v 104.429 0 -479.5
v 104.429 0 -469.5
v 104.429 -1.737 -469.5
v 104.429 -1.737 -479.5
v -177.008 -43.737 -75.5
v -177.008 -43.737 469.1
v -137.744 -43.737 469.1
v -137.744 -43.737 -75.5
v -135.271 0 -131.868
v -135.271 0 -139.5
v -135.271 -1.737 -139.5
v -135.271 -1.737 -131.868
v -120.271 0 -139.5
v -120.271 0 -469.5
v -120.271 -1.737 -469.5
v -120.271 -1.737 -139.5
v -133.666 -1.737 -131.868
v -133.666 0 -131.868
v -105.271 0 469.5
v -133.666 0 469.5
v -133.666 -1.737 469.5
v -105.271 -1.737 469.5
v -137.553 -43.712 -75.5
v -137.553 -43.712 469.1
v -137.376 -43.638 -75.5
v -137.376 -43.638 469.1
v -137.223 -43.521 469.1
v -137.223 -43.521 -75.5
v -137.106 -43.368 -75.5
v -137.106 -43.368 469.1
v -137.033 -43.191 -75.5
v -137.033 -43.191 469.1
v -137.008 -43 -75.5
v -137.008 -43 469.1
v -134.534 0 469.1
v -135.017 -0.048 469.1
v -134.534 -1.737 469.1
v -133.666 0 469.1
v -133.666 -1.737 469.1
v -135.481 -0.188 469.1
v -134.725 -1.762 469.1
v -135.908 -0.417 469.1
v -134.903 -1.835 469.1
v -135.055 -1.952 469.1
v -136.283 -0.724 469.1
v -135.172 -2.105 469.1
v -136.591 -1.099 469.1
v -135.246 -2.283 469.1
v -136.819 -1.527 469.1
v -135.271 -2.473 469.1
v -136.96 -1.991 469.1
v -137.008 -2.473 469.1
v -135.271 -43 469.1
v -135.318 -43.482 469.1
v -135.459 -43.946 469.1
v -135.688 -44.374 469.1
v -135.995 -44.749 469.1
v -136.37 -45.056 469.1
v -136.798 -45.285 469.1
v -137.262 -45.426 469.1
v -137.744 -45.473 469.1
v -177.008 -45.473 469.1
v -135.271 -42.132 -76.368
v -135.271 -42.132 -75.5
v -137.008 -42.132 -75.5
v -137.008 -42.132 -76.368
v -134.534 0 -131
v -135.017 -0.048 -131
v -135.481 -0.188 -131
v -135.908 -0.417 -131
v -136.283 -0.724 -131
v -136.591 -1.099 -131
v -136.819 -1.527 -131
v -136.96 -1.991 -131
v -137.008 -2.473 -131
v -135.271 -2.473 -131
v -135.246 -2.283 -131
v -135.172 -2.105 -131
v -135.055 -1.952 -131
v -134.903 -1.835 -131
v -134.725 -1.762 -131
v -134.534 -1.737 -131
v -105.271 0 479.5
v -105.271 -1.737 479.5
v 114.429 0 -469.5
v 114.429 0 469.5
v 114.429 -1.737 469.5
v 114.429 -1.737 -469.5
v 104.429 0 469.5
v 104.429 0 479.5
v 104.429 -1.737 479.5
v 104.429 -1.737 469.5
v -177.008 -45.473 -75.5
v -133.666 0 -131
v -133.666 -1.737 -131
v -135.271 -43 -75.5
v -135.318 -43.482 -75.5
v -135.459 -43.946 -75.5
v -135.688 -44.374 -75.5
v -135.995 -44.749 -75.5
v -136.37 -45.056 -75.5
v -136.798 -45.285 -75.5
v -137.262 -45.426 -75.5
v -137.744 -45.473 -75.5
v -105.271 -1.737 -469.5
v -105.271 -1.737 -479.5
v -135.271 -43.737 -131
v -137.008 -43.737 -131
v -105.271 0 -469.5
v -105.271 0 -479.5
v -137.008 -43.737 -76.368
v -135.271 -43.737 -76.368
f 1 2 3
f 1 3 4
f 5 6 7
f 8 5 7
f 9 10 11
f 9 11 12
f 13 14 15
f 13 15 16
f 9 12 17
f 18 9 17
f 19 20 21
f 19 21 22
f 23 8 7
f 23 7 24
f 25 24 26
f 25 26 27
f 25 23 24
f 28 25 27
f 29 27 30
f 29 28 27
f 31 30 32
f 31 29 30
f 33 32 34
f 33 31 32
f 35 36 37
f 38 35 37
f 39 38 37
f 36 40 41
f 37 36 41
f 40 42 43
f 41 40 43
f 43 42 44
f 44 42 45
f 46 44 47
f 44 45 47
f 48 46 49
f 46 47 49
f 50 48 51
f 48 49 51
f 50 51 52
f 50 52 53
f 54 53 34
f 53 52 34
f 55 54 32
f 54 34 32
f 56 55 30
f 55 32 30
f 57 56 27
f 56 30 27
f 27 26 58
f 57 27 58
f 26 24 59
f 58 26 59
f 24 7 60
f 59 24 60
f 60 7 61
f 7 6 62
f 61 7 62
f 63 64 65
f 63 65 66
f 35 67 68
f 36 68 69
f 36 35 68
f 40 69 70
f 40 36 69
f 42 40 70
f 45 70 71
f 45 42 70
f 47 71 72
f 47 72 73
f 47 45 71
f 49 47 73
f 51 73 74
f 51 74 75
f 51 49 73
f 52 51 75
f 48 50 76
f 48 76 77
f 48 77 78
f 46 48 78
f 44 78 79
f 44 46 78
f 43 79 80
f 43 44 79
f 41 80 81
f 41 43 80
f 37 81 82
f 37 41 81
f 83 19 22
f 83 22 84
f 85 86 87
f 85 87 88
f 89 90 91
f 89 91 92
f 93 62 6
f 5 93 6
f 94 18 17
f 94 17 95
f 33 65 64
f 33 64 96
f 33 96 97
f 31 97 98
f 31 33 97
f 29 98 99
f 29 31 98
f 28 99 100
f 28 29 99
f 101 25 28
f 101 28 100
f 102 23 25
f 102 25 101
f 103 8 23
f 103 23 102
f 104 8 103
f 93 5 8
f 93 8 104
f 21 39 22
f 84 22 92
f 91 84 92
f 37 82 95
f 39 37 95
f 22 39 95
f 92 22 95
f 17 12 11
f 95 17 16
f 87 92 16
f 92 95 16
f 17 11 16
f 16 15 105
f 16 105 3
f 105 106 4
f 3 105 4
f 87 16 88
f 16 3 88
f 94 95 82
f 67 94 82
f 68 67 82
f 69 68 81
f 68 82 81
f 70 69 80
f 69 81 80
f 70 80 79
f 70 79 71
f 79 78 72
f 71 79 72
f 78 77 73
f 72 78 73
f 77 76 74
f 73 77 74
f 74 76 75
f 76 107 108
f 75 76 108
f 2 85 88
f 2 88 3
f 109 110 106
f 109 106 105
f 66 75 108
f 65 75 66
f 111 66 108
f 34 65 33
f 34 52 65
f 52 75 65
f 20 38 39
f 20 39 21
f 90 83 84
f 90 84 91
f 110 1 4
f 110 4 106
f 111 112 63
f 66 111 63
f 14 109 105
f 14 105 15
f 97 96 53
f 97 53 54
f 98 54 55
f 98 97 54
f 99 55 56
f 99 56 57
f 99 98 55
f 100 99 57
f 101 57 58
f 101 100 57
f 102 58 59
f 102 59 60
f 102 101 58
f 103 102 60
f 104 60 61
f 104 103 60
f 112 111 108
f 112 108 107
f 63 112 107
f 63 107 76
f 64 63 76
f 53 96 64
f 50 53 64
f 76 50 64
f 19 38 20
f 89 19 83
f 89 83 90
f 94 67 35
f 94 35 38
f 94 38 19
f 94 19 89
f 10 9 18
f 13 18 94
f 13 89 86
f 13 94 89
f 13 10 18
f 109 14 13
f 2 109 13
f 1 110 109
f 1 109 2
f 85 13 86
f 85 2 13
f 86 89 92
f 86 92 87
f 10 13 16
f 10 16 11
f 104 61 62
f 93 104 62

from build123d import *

# Parameters (mm, degrees)
BASE_FLANGE1_DEPTH            = 1.7366
EDGE_FLANGE1_STRIP_W          = 8.4196
EDGE_FLANGE1_STRIP_H          = 1.7366
EDGE_FLANGE1_STRIP_CUT_DEPTH  = 600.1
EDGE_FLANGE1_RELIEF_W         = 9.2879
EDGE_FLANGE1_RELIEF_H         = 0.8683
EDGE_FLANGE1_RELIEF_CUT_DEPTH = 1.7366
EDGE_FLANGE1_DEPTH            = 600.1
EDGE_FLANGE2_STRIP_W          = 8.4196
EDGE_FLANGE2_STRIP_H          = 1.7366
EDGE_FLANGE2_STRIP_CUT_DEPTH  = 544.6
EDGE_FLANGE2_RELIEF_W         = 9.2879
EDGE_FLANGE2_RELIEF_H         = 0.8683
EDGE_FLANGE2_RELIEF_CUT_DEPTH = 1.7366
EDGE_FLANGE2_DEPTH            = 544.6


# Sheet-metal steps are written as plain solids
with BuildPart() as part:
    # Sketch1 → Base-Flange1 (new body)
    with BuildSketch(Plane(origin=(0, 0, 0), x_dir=(1, 0, 0), z_dir=(0, 1, 0))):
        Polygon((-105.270941838, 479.5), (-105.270941838, 469.5), (-120.270941838, 469.5), (-120.270941838, 139.5), (-135.270941838, 139.5), (-135.270941838, -469.5), (-120.270941838, -469.5), (-105.270941838, -469.5), (-105.270941838, -479.5), (104.429058162, -479.5), (104.429058162, -469.5), (114.429058162, -469.5), (114.429058162, 469.5), (104.429058162, 469.5), (104.429058162, 479.5), align=None)
    extrude(amount=-BASE_FLANGE1_DEPTH)

    # Edge-Flange1 strip (across the edge) → Edge-Flange1 strip cut (cut)
    with BuildSketch(Plane(origin=(-135.270941838, -1.7366, 469.1), x_dir=(1, 0, 0), z_dir=(0, 0, -1))):
        with Locations((-3.4732, -0.8683)):
            Rectangle(EDGE_FLANGE1_STRIP_W, EDGE_FLANGE1_STRIP_H)
    extrude(amount=EDGE_FLANGE1_STRIP_CUT_DEPTH, mode=Mode.SUBTRACT)

    # Edge-Flange1 relief (on the sheet) → Edge-Flange1 relief cut (cut)
    with BuildSketch(Plane(origin=(-134.534341838, -1.7366, 469.1), x_dir=(1, 0, 0), z_dir=(0, -1, 0))):
        with Locations((-3.77565, 0.43415)):
            Rectangle(EDGE_FLANGE1_RELIEF_W, EDGE_FLANGE1_RELIEF_H)
        with Locations((-3.77565, -600.53415)):
            Rectangle(EDGE_FLANGE1_RELIEF_W, EDGE_FLANGE1_RELIEF_H)
    extrude(amount=-EDGE_FLANGE1_RELIEF_CUT_DEPTH, mode=Mode.SUBTRACT)

    # Edge-Flange1 section (across the edge) → Edge-Flange1 (add)
    with BuildSketch(Plane(origin=(-135.270941838, -1.7366, 469.1), x_dir=(1, 0, 0), z_dir=(0, 0, -1))):
        with BuildLine():
            Line((-1.7366, 0.7366), (-1.7366, 42))
            Line((-1.7366, 42), (0, 42))
            Line((0, 42), (0, 0.7366))
            ThreePointArc((0, 0.7366), (0.215745145, 0.215745145), (0.7366, 0))
            Line((0.7366, 0), (0.7366, -1.7366))
            ThreePointArc((0.7366, -1.7366), (-1.012216491, -1.012216491), (-1.7366, 0.7366))
        make_face()
    extrude(amount=EDGE_FLANGE1_DEPTH)

    # Edge-Flange2 strip (across the edge) → Edge-Flange2 strip cut (cut)
    with BuildSketch(Plane(origin=(-137.007541838, -43.7366, -75.5), x_dir=(0, 1, 0), z_dir=(0, 0, 1))):
        with Locations((-3.4732, -0.8683)):
            Rectangle(EDGE_FLANGE2_STRIP_W, EDGE_FLANGE2_STRIP_H)
    extrude(amount=EDGE_FLANGE2_STRIP_CUT_DEPTH, mode=Mode.SUBTRACT)

    # Edge-Flange2 relief (on the sheet) → Edge-Flange2 relief cut (cut)
    with BuildSketch(Plane(origin=(-137.007541838, -43, -75.5), x_dir=(0, 1, 0), z_dir=(-1, 0, 0))):
        with Locations((-3.77565, 0.43415)):
            Rectangle(EDGE_FLANGE2_RELIEF_W, EDGE_FLANGE2_RELIEF_H)
    extrude(amount=-EDGE_FLANGE2_RELIEF_CUT_DEPTH, mode=Mode.SUBTRACT)

    # Edge-Flange2 section (across the edge) → Edge-Flange2 (add)
    with BuildSketch(Plane(origin=(-137.007541838, -43.7366, -75.5), x_dir=(0, 1, 0), z_dir=(0, 0, 1))):
        with BuildLine():
            Line((-1.7366, 0.7366), (-1.7366, 40))
            Line((-1.7366, 40), (0, 40))
            Line((0, 40), (0, 0.7366))
            ThreePointArc((0, 0.7366), (0.215745145, 0.215745145), (0.7366, 0))
            Line((0.7366, 0), (0.7366, -1.7366))
            ThreePointArc((0.7366, -1.7366), (-1.012216491, -1.012216491), (-1.7366, 0.7366))
        make_face()
    extrude(amount=EDGE_FLANGE2_DEPTH)


solid = part.part
